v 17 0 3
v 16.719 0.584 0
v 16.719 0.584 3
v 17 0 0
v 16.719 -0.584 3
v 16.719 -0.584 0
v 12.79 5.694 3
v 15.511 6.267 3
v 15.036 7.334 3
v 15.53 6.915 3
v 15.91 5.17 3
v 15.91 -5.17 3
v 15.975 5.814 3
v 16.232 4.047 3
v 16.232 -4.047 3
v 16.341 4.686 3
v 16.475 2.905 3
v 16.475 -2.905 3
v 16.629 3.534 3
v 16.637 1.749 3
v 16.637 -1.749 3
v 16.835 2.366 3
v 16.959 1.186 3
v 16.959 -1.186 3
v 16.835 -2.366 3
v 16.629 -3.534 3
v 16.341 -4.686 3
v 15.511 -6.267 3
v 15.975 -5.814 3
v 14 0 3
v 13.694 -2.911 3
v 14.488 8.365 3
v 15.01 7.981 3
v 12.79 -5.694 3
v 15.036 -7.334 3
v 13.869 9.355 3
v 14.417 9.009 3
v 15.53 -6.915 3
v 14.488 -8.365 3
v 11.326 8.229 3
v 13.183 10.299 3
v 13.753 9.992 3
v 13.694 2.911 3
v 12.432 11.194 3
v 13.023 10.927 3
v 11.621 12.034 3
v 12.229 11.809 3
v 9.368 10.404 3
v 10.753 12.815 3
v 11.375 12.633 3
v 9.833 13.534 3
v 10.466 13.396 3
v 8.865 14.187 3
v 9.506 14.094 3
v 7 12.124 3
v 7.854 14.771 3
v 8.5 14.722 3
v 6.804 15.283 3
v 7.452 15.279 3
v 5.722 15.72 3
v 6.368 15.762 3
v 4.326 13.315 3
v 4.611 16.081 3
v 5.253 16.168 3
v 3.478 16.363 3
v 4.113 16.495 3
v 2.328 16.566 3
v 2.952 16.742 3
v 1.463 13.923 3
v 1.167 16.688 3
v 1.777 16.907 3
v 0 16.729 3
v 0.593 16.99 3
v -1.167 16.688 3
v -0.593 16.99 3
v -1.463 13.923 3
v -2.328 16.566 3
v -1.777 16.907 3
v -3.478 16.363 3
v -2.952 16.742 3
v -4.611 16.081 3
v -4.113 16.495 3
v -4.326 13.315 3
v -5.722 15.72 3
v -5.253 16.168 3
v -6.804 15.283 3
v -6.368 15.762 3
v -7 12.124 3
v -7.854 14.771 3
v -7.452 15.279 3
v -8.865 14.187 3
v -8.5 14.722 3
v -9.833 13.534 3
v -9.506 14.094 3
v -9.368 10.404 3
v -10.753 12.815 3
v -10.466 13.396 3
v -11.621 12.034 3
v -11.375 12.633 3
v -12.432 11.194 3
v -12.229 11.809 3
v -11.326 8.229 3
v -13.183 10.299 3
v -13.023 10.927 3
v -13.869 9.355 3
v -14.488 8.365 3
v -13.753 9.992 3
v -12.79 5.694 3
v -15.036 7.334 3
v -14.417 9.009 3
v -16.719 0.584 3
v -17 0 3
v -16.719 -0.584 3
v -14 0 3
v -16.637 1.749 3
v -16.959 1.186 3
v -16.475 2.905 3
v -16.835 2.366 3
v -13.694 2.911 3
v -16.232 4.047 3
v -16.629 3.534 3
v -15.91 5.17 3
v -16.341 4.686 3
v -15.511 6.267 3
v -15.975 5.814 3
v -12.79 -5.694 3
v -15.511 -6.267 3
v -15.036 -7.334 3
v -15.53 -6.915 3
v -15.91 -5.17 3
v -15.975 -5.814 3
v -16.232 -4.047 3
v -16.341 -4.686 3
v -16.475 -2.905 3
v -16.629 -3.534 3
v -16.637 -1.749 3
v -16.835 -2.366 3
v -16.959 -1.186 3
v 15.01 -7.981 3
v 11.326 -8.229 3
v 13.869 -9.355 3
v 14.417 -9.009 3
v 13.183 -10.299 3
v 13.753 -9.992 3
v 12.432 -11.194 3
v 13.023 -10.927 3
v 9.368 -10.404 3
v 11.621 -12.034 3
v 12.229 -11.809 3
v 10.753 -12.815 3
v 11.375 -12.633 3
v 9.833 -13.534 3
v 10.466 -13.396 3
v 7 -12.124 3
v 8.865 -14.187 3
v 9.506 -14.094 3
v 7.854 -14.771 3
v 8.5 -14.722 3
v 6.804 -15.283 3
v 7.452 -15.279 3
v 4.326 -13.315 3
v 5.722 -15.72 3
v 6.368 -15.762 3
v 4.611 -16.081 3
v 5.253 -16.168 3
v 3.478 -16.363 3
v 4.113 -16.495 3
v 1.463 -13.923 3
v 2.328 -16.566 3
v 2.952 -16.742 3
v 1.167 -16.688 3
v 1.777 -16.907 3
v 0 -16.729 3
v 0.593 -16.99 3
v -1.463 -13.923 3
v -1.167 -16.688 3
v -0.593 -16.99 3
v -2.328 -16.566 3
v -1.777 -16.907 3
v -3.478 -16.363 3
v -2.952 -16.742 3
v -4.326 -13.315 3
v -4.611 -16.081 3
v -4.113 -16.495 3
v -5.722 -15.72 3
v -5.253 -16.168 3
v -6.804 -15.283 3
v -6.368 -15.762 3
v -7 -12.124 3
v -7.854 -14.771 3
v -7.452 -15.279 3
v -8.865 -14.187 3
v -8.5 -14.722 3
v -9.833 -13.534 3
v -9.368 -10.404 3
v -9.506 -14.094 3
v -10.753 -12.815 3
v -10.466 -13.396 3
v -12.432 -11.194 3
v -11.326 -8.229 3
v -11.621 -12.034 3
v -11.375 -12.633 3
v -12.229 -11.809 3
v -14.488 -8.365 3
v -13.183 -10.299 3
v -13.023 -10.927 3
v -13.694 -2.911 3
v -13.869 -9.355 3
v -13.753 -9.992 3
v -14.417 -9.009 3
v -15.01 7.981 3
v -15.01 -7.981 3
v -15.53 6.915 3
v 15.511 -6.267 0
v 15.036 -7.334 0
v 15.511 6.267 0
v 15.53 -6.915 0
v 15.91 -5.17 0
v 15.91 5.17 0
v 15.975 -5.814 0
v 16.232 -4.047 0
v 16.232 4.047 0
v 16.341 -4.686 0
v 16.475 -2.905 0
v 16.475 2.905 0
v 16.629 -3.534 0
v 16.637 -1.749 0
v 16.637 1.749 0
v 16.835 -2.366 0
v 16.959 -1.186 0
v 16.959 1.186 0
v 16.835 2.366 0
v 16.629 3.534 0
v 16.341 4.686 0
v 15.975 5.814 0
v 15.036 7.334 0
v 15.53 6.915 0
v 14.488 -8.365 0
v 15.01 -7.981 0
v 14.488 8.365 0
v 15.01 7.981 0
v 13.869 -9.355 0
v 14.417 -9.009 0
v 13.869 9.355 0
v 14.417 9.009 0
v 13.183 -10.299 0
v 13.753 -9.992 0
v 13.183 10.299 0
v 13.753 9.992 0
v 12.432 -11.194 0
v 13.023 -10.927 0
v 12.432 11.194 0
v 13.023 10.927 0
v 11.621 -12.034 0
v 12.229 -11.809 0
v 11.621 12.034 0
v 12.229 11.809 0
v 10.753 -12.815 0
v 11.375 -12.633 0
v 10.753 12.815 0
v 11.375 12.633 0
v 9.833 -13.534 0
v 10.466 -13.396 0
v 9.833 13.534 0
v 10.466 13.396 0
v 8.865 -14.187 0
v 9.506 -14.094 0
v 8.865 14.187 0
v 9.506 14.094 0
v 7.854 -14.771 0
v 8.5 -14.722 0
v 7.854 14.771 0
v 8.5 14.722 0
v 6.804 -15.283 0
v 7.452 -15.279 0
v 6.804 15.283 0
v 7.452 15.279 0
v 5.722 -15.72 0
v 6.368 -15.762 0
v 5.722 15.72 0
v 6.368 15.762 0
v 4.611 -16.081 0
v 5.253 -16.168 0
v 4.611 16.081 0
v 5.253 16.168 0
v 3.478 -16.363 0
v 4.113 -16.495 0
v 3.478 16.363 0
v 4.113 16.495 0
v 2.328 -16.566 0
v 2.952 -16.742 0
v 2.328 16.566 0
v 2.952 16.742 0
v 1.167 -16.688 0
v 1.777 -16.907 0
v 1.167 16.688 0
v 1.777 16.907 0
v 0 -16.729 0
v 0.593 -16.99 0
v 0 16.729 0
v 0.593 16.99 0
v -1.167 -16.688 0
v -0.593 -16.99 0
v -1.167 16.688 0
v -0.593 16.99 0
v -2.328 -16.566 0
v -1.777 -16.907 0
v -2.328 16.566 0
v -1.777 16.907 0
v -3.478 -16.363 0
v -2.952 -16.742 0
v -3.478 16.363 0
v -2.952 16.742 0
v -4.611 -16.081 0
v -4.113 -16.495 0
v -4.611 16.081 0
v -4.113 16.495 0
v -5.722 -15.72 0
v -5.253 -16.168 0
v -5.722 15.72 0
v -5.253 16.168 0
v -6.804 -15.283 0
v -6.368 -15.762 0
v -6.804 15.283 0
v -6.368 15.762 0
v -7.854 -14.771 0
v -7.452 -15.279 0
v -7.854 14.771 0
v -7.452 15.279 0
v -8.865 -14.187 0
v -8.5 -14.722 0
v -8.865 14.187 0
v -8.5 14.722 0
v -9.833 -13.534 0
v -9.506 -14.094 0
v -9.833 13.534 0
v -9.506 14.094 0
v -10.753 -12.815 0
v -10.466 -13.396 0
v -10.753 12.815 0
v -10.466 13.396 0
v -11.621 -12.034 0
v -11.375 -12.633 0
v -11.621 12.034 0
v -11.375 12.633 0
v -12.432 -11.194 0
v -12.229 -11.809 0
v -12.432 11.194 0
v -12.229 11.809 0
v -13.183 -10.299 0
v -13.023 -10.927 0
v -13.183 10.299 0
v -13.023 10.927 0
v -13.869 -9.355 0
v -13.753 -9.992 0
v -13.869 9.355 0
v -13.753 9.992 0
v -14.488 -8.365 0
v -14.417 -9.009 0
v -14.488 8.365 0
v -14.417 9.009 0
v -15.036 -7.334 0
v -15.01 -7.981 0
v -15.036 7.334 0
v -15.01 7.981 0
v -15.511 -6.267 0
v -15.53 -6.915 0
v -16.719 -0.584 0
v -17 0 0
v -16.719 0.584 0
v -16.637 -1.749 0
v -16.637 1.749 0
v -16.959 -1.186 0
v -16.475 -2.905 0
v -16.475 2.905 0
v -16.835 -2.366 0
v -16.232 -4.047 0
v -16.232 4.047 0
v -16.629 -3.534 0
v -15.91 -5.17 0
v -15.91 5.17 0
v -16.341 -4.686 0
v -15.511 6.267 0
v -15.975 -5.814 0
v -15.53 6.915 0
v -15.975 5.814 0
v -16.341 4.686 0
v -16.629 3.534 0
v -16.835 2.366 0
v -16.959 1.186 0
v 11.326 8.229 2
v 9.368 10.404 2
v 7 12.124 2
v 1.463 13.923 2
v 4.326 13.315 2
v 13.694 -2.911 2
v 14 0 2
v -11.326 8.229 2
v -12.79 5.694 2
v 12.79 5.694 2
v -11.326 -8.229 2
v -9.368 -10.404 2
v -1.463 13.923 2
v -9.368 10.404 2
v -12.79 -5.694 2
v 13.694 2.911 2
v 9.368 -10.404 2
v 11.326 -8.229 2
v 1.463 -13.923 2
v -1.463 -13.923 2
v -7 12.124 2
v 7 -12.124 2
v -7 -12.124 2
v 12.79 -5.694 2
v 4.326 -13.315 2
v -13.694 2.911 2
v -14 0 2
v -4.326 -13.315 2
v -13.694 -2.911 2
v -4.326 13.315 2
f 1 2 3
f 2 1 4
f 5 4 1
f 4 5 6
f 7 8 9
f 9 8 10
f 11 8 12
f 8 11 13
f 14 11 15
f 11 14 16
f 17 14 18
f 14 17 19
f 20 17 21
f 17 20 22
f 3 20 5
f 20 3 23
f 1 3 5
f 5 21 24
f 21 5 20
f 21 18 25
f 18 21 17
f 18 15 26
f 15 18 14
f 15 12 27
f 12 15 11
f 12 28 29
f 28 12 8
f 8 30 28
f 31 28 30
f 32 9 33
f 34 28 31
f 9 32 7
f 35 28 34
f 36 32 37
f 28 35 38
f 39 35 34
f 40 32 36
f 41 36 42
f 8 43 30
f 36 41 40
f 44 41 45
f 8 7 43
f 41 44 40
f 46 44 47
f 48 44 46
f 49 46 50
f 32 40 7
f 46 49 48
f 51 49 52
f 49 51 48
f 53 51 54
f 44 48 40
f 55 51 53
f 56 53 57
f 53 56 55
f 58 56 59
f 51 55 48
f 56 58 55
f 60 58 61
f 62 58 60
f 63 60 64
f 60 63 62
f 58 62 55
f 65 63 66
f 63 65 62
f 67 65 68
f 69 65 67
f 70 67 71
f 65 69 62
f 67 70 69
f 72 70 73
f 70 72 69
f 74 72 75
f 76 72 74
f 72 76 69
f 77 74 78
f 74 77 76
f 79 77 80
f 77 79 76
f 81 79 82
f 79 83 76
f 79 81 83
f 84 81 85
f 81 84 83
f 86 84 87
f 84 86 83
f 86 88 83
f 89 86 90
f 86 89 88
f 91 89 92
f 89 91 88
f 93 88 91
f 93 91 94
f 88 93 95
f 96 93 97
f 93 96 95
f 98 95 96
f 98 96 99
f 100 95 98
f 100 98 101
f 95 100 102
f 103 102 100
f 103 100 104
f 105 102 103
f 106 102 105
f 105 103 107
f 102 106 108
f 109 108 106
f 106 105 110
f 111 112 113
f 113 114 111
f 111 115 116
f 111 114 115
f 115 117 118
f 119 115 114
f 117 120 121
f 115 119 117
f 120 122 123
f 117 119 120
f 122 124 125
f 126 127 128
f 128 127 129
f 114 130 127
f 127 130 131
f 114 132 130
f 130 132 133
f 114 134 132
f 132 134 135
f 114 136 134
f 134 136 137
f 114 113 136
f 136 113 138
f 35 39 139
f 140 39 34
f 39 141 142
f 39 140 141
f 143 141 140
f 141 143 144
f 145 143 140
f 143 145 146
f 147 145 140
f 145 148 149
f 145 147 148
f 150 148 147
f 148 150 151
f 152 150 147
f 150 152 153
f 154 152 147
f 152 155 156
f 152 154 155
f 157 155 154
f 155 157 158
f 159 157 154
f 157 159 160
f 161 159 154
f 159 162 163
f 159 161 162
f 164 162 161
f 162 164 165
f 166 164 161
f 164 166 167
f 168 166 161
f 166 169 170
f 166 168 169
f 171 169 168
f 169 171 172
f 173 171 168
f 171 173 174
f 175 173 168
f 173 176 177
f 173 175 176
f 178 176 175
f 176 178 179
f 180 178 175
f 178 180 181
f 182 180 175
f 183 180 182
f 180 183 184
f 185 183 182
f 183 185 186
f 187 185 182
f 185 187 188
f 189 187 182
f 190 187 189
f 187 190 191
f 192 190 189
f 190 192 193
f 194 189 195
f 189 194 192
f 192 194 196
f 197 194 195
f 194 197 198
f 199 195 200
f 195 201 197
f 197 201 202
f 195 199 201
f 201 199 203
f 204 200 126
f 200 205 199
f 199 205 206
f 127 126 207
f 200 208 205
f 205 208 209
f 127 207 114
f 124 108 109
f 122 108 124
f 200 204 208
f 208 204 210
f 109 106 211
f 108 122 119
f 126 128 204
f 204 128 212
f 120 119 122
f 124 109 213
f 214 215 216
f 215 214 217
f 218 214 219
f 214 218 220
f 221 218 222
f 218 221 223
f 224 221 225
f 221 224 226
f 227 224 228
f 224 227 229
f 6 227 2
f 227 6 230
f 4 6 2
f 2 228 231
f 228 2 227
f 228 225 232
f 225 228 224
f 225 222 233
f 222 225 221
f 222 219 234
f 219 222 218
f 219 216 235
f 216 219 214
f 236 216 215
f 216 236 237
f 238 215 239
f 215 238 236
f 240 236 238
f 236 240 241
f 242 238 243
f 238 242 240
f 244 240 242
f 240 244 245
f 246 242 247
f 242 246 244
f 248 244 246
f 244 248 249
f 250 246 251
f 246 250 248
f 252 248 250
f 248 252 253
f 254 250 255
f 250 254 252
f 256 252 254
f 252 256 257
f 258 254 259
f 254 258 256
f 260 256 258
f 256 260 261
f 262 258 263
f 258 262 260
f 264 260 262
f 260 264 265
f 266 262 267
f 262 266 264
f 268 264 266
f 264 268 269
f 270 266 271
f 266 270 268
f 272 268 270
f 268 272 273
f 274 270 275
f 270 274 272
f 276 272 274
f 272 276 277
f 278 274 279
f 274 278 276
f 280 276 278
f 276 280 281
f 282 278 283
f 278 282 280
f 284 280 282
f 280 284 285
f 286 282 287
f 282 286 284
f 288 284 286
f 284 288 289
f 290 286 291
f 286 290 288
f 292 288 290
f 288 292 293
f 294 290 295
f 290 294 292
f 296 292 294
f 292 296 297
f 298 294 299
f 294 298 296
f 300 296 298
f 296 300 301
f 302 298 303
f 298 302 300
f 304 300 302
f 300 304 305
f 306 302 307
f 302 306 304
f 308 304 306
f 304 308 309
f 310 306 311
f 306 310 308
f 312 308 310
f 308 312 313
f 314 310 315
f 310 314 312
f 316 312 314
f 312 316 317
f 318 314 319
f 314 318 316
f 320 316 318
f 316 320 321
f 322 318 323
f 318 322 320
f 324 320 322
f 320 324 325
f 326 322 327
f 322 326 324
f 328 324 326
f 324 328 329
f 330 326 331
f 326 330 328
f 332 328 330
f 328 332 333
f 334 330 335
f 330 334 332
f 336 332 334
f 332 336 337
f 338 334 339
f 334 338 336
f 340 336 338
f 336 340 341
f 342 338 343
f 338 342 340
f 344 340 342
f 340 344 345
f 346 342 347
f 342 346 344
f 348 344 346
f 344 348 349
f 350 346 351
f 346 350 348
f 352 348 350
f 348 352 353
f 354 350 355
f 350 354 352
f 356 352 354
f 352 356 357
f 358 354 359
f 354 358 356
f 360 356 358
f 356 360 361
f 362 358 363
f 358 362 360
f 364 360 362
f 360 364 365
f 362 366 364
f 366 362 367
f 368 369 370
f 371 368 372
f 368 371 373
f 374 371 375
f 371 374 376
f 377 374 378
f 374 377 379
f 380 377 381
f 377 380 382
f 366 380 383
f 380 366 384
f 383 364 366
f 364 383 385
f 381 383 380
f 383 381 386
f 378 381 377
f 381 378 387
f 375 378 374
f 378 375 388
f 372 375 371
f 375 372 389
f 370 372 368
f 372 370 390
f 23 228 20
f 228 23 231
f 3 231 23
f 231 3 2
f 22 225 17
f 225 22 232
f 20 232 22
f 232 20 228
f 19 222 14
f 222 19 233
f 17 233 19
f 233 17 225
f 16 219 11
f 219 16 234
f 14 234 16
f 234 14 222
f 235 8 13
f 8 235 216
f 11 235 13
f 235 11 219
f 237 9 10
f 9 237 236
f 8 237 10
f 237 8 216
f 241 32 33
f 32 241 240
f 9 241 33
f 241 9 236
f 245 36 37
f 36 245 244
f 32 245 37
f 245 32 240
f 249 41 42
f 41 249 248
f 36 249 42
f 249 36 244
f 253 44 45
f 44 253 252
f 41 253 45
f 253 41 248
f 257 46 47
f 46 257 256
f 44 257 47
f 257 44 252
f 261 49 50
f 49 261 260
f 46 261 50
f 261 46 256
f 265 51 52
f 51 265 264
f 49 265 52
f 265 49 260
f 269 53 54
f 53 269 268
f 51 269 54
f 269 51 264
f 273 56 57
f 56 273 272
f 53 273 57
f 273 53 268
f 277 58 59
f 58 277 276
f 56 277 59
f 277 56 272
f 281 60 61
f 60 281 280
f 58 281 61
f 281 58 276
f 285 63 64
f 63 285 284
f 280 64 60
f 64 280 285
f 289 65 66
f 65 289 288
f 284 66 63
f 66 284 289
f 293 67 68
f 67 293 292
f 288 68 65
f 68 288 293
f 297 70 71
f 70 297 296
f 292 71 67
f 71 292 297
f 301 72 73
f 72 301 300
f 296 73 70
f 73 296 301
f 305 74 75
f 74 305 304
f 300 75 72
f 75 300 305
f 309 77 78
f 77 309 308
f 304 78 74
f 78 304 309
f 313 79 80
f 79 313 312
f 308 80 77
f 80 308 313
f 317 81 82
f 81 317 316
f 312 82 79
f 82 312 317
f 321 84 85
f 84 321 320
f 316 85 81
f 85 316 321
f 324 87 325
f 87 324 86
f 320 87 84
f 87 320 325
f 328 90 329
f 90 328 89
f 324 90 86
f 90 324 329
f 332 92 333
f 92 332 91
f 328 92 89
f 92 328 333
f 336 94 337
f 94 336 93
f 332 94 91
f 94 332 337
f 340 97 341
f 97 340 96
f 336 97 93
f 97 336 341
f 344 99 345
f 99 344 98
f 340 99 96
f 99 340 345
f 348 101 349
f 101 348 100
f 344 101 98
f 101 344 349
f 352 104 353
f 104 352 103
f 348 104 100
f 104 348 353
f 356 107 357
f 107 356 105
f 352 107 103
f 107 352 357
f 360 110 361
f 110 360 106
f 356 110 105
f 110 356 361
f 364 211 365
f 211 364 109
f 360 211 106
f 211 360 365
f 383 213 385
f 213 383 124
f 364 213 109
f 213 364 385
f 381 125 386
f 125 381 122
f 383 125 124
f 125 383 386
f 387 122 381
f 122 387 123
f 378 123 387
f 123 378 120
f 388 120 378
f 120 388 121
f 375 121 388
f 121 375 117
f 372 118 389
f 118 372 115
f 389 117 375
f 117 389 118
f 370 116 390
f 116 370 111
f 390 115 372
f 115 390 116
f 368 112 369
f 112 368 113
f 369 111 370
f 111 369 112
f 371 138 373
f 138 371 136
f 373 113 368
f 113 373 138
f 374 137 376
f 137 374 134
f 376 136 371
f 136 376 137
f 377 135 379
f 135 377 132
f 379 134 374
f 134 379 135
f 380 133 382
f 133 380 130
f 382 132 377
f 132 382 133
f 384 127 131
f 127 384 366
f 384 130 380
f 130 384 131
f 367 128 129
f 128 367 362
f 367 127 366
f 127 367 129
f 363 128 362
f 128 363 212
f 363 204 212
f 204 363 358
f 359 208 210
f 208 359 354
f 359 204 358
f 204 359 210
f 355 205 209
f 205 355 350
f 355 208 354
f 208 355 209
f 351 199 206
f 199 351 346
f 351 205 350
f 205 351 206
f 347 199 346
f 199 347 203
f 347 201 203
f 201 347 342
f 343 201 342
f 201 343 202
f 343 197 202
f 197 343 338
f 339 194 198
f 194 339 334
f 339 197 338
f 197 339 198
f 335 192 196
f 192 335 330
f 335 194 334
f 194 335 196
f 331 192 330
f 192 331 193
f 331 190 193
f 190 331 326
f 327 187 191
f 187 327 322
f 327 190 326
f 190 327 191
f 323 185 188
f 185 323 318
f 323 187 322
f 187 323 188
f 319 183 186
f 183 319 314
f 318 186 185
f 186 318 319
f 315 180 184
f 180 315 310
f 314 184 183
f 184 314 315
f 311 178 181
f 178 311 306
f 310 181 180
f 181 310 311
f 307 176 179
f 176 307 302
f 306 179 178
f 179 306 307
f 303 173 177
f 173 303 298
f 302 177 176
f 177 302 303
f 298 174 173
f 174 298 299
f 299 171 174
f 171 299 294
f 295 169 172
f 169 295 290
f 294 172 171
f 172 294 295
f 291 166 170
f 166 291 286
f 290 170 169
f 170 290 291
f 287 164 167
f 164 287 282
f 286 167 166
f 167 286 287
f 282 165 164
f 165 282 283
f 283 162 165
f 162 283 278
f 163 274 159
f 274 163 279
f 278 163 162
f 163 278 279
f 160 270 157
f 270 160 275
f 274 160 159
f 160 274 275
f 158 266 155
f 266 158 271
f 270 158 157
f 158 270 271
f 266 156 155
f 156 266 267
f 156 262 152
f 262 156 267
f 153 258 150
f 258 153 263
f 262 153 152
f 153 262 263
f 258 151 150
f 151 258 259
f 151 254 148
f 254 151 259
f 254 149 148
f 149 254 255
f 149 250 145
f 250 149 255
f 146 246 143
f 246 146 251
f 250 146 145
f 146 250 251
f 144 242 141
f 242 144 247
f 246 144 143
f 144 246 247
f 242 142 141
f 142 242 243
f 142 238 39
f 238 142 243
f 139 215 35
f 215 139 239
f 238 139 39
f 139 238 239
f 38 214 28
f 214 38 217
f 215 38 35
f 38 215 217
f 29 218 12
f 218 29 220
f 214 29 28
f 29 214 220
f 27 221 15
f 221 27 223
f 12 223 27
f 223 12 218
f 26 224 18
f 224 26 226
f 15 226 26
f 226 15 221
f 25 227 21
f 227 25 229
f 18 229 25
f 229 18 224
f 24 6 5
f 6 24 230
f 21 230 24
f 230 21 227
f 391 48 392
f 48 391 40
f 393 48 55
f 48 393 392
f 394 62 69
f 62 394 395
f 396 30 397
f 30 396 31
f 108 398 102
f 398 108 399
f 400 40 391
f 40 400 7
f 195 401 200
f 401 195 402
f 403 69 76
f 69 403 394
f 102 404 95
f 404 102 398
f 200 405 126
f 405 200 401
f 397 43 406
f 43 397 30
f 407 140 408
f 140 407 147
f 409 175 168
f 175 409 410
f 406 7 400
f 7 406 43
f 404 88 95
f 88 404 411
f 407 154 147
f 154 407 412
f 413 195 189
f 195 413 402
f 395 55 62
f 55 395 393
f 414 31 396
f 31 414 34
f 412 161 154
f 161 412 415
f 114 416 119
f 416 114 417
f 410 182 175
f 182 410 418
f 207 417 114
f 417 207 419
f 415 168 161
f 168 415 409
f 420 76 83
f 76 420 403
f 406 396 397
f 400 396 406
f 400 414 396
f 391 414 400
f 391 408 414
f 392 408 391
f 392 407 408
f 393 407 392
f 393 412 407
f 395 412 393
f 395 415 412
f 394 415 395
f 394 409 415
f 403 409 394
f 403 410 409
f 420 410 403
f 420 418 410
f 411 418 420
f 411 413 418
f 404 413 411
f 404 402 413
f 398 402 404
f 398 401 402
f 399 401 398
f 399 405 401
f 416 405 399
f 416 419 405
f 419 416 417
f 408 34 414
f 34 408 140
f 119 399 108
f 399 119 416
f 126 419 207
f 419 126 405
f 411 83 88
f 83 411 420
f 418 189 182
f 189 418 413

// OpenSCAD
module coin() {
  for(n=[0:90]) {
    rotate([0,0,n*4]) translate([15,0,0]) cylinder(r = 2, h = 3);
  }
  cylinder(r = 14, h = 3);
}

difference() {
  coin();
  translate([0,0,2]) cylinder(r = 14, h = 2);
}
translate([-11,-10,2]) scale([0.26,0.26,1]) linear_extrude(file = "skull-and-x-bones.dxf", height = 2, center = true);
